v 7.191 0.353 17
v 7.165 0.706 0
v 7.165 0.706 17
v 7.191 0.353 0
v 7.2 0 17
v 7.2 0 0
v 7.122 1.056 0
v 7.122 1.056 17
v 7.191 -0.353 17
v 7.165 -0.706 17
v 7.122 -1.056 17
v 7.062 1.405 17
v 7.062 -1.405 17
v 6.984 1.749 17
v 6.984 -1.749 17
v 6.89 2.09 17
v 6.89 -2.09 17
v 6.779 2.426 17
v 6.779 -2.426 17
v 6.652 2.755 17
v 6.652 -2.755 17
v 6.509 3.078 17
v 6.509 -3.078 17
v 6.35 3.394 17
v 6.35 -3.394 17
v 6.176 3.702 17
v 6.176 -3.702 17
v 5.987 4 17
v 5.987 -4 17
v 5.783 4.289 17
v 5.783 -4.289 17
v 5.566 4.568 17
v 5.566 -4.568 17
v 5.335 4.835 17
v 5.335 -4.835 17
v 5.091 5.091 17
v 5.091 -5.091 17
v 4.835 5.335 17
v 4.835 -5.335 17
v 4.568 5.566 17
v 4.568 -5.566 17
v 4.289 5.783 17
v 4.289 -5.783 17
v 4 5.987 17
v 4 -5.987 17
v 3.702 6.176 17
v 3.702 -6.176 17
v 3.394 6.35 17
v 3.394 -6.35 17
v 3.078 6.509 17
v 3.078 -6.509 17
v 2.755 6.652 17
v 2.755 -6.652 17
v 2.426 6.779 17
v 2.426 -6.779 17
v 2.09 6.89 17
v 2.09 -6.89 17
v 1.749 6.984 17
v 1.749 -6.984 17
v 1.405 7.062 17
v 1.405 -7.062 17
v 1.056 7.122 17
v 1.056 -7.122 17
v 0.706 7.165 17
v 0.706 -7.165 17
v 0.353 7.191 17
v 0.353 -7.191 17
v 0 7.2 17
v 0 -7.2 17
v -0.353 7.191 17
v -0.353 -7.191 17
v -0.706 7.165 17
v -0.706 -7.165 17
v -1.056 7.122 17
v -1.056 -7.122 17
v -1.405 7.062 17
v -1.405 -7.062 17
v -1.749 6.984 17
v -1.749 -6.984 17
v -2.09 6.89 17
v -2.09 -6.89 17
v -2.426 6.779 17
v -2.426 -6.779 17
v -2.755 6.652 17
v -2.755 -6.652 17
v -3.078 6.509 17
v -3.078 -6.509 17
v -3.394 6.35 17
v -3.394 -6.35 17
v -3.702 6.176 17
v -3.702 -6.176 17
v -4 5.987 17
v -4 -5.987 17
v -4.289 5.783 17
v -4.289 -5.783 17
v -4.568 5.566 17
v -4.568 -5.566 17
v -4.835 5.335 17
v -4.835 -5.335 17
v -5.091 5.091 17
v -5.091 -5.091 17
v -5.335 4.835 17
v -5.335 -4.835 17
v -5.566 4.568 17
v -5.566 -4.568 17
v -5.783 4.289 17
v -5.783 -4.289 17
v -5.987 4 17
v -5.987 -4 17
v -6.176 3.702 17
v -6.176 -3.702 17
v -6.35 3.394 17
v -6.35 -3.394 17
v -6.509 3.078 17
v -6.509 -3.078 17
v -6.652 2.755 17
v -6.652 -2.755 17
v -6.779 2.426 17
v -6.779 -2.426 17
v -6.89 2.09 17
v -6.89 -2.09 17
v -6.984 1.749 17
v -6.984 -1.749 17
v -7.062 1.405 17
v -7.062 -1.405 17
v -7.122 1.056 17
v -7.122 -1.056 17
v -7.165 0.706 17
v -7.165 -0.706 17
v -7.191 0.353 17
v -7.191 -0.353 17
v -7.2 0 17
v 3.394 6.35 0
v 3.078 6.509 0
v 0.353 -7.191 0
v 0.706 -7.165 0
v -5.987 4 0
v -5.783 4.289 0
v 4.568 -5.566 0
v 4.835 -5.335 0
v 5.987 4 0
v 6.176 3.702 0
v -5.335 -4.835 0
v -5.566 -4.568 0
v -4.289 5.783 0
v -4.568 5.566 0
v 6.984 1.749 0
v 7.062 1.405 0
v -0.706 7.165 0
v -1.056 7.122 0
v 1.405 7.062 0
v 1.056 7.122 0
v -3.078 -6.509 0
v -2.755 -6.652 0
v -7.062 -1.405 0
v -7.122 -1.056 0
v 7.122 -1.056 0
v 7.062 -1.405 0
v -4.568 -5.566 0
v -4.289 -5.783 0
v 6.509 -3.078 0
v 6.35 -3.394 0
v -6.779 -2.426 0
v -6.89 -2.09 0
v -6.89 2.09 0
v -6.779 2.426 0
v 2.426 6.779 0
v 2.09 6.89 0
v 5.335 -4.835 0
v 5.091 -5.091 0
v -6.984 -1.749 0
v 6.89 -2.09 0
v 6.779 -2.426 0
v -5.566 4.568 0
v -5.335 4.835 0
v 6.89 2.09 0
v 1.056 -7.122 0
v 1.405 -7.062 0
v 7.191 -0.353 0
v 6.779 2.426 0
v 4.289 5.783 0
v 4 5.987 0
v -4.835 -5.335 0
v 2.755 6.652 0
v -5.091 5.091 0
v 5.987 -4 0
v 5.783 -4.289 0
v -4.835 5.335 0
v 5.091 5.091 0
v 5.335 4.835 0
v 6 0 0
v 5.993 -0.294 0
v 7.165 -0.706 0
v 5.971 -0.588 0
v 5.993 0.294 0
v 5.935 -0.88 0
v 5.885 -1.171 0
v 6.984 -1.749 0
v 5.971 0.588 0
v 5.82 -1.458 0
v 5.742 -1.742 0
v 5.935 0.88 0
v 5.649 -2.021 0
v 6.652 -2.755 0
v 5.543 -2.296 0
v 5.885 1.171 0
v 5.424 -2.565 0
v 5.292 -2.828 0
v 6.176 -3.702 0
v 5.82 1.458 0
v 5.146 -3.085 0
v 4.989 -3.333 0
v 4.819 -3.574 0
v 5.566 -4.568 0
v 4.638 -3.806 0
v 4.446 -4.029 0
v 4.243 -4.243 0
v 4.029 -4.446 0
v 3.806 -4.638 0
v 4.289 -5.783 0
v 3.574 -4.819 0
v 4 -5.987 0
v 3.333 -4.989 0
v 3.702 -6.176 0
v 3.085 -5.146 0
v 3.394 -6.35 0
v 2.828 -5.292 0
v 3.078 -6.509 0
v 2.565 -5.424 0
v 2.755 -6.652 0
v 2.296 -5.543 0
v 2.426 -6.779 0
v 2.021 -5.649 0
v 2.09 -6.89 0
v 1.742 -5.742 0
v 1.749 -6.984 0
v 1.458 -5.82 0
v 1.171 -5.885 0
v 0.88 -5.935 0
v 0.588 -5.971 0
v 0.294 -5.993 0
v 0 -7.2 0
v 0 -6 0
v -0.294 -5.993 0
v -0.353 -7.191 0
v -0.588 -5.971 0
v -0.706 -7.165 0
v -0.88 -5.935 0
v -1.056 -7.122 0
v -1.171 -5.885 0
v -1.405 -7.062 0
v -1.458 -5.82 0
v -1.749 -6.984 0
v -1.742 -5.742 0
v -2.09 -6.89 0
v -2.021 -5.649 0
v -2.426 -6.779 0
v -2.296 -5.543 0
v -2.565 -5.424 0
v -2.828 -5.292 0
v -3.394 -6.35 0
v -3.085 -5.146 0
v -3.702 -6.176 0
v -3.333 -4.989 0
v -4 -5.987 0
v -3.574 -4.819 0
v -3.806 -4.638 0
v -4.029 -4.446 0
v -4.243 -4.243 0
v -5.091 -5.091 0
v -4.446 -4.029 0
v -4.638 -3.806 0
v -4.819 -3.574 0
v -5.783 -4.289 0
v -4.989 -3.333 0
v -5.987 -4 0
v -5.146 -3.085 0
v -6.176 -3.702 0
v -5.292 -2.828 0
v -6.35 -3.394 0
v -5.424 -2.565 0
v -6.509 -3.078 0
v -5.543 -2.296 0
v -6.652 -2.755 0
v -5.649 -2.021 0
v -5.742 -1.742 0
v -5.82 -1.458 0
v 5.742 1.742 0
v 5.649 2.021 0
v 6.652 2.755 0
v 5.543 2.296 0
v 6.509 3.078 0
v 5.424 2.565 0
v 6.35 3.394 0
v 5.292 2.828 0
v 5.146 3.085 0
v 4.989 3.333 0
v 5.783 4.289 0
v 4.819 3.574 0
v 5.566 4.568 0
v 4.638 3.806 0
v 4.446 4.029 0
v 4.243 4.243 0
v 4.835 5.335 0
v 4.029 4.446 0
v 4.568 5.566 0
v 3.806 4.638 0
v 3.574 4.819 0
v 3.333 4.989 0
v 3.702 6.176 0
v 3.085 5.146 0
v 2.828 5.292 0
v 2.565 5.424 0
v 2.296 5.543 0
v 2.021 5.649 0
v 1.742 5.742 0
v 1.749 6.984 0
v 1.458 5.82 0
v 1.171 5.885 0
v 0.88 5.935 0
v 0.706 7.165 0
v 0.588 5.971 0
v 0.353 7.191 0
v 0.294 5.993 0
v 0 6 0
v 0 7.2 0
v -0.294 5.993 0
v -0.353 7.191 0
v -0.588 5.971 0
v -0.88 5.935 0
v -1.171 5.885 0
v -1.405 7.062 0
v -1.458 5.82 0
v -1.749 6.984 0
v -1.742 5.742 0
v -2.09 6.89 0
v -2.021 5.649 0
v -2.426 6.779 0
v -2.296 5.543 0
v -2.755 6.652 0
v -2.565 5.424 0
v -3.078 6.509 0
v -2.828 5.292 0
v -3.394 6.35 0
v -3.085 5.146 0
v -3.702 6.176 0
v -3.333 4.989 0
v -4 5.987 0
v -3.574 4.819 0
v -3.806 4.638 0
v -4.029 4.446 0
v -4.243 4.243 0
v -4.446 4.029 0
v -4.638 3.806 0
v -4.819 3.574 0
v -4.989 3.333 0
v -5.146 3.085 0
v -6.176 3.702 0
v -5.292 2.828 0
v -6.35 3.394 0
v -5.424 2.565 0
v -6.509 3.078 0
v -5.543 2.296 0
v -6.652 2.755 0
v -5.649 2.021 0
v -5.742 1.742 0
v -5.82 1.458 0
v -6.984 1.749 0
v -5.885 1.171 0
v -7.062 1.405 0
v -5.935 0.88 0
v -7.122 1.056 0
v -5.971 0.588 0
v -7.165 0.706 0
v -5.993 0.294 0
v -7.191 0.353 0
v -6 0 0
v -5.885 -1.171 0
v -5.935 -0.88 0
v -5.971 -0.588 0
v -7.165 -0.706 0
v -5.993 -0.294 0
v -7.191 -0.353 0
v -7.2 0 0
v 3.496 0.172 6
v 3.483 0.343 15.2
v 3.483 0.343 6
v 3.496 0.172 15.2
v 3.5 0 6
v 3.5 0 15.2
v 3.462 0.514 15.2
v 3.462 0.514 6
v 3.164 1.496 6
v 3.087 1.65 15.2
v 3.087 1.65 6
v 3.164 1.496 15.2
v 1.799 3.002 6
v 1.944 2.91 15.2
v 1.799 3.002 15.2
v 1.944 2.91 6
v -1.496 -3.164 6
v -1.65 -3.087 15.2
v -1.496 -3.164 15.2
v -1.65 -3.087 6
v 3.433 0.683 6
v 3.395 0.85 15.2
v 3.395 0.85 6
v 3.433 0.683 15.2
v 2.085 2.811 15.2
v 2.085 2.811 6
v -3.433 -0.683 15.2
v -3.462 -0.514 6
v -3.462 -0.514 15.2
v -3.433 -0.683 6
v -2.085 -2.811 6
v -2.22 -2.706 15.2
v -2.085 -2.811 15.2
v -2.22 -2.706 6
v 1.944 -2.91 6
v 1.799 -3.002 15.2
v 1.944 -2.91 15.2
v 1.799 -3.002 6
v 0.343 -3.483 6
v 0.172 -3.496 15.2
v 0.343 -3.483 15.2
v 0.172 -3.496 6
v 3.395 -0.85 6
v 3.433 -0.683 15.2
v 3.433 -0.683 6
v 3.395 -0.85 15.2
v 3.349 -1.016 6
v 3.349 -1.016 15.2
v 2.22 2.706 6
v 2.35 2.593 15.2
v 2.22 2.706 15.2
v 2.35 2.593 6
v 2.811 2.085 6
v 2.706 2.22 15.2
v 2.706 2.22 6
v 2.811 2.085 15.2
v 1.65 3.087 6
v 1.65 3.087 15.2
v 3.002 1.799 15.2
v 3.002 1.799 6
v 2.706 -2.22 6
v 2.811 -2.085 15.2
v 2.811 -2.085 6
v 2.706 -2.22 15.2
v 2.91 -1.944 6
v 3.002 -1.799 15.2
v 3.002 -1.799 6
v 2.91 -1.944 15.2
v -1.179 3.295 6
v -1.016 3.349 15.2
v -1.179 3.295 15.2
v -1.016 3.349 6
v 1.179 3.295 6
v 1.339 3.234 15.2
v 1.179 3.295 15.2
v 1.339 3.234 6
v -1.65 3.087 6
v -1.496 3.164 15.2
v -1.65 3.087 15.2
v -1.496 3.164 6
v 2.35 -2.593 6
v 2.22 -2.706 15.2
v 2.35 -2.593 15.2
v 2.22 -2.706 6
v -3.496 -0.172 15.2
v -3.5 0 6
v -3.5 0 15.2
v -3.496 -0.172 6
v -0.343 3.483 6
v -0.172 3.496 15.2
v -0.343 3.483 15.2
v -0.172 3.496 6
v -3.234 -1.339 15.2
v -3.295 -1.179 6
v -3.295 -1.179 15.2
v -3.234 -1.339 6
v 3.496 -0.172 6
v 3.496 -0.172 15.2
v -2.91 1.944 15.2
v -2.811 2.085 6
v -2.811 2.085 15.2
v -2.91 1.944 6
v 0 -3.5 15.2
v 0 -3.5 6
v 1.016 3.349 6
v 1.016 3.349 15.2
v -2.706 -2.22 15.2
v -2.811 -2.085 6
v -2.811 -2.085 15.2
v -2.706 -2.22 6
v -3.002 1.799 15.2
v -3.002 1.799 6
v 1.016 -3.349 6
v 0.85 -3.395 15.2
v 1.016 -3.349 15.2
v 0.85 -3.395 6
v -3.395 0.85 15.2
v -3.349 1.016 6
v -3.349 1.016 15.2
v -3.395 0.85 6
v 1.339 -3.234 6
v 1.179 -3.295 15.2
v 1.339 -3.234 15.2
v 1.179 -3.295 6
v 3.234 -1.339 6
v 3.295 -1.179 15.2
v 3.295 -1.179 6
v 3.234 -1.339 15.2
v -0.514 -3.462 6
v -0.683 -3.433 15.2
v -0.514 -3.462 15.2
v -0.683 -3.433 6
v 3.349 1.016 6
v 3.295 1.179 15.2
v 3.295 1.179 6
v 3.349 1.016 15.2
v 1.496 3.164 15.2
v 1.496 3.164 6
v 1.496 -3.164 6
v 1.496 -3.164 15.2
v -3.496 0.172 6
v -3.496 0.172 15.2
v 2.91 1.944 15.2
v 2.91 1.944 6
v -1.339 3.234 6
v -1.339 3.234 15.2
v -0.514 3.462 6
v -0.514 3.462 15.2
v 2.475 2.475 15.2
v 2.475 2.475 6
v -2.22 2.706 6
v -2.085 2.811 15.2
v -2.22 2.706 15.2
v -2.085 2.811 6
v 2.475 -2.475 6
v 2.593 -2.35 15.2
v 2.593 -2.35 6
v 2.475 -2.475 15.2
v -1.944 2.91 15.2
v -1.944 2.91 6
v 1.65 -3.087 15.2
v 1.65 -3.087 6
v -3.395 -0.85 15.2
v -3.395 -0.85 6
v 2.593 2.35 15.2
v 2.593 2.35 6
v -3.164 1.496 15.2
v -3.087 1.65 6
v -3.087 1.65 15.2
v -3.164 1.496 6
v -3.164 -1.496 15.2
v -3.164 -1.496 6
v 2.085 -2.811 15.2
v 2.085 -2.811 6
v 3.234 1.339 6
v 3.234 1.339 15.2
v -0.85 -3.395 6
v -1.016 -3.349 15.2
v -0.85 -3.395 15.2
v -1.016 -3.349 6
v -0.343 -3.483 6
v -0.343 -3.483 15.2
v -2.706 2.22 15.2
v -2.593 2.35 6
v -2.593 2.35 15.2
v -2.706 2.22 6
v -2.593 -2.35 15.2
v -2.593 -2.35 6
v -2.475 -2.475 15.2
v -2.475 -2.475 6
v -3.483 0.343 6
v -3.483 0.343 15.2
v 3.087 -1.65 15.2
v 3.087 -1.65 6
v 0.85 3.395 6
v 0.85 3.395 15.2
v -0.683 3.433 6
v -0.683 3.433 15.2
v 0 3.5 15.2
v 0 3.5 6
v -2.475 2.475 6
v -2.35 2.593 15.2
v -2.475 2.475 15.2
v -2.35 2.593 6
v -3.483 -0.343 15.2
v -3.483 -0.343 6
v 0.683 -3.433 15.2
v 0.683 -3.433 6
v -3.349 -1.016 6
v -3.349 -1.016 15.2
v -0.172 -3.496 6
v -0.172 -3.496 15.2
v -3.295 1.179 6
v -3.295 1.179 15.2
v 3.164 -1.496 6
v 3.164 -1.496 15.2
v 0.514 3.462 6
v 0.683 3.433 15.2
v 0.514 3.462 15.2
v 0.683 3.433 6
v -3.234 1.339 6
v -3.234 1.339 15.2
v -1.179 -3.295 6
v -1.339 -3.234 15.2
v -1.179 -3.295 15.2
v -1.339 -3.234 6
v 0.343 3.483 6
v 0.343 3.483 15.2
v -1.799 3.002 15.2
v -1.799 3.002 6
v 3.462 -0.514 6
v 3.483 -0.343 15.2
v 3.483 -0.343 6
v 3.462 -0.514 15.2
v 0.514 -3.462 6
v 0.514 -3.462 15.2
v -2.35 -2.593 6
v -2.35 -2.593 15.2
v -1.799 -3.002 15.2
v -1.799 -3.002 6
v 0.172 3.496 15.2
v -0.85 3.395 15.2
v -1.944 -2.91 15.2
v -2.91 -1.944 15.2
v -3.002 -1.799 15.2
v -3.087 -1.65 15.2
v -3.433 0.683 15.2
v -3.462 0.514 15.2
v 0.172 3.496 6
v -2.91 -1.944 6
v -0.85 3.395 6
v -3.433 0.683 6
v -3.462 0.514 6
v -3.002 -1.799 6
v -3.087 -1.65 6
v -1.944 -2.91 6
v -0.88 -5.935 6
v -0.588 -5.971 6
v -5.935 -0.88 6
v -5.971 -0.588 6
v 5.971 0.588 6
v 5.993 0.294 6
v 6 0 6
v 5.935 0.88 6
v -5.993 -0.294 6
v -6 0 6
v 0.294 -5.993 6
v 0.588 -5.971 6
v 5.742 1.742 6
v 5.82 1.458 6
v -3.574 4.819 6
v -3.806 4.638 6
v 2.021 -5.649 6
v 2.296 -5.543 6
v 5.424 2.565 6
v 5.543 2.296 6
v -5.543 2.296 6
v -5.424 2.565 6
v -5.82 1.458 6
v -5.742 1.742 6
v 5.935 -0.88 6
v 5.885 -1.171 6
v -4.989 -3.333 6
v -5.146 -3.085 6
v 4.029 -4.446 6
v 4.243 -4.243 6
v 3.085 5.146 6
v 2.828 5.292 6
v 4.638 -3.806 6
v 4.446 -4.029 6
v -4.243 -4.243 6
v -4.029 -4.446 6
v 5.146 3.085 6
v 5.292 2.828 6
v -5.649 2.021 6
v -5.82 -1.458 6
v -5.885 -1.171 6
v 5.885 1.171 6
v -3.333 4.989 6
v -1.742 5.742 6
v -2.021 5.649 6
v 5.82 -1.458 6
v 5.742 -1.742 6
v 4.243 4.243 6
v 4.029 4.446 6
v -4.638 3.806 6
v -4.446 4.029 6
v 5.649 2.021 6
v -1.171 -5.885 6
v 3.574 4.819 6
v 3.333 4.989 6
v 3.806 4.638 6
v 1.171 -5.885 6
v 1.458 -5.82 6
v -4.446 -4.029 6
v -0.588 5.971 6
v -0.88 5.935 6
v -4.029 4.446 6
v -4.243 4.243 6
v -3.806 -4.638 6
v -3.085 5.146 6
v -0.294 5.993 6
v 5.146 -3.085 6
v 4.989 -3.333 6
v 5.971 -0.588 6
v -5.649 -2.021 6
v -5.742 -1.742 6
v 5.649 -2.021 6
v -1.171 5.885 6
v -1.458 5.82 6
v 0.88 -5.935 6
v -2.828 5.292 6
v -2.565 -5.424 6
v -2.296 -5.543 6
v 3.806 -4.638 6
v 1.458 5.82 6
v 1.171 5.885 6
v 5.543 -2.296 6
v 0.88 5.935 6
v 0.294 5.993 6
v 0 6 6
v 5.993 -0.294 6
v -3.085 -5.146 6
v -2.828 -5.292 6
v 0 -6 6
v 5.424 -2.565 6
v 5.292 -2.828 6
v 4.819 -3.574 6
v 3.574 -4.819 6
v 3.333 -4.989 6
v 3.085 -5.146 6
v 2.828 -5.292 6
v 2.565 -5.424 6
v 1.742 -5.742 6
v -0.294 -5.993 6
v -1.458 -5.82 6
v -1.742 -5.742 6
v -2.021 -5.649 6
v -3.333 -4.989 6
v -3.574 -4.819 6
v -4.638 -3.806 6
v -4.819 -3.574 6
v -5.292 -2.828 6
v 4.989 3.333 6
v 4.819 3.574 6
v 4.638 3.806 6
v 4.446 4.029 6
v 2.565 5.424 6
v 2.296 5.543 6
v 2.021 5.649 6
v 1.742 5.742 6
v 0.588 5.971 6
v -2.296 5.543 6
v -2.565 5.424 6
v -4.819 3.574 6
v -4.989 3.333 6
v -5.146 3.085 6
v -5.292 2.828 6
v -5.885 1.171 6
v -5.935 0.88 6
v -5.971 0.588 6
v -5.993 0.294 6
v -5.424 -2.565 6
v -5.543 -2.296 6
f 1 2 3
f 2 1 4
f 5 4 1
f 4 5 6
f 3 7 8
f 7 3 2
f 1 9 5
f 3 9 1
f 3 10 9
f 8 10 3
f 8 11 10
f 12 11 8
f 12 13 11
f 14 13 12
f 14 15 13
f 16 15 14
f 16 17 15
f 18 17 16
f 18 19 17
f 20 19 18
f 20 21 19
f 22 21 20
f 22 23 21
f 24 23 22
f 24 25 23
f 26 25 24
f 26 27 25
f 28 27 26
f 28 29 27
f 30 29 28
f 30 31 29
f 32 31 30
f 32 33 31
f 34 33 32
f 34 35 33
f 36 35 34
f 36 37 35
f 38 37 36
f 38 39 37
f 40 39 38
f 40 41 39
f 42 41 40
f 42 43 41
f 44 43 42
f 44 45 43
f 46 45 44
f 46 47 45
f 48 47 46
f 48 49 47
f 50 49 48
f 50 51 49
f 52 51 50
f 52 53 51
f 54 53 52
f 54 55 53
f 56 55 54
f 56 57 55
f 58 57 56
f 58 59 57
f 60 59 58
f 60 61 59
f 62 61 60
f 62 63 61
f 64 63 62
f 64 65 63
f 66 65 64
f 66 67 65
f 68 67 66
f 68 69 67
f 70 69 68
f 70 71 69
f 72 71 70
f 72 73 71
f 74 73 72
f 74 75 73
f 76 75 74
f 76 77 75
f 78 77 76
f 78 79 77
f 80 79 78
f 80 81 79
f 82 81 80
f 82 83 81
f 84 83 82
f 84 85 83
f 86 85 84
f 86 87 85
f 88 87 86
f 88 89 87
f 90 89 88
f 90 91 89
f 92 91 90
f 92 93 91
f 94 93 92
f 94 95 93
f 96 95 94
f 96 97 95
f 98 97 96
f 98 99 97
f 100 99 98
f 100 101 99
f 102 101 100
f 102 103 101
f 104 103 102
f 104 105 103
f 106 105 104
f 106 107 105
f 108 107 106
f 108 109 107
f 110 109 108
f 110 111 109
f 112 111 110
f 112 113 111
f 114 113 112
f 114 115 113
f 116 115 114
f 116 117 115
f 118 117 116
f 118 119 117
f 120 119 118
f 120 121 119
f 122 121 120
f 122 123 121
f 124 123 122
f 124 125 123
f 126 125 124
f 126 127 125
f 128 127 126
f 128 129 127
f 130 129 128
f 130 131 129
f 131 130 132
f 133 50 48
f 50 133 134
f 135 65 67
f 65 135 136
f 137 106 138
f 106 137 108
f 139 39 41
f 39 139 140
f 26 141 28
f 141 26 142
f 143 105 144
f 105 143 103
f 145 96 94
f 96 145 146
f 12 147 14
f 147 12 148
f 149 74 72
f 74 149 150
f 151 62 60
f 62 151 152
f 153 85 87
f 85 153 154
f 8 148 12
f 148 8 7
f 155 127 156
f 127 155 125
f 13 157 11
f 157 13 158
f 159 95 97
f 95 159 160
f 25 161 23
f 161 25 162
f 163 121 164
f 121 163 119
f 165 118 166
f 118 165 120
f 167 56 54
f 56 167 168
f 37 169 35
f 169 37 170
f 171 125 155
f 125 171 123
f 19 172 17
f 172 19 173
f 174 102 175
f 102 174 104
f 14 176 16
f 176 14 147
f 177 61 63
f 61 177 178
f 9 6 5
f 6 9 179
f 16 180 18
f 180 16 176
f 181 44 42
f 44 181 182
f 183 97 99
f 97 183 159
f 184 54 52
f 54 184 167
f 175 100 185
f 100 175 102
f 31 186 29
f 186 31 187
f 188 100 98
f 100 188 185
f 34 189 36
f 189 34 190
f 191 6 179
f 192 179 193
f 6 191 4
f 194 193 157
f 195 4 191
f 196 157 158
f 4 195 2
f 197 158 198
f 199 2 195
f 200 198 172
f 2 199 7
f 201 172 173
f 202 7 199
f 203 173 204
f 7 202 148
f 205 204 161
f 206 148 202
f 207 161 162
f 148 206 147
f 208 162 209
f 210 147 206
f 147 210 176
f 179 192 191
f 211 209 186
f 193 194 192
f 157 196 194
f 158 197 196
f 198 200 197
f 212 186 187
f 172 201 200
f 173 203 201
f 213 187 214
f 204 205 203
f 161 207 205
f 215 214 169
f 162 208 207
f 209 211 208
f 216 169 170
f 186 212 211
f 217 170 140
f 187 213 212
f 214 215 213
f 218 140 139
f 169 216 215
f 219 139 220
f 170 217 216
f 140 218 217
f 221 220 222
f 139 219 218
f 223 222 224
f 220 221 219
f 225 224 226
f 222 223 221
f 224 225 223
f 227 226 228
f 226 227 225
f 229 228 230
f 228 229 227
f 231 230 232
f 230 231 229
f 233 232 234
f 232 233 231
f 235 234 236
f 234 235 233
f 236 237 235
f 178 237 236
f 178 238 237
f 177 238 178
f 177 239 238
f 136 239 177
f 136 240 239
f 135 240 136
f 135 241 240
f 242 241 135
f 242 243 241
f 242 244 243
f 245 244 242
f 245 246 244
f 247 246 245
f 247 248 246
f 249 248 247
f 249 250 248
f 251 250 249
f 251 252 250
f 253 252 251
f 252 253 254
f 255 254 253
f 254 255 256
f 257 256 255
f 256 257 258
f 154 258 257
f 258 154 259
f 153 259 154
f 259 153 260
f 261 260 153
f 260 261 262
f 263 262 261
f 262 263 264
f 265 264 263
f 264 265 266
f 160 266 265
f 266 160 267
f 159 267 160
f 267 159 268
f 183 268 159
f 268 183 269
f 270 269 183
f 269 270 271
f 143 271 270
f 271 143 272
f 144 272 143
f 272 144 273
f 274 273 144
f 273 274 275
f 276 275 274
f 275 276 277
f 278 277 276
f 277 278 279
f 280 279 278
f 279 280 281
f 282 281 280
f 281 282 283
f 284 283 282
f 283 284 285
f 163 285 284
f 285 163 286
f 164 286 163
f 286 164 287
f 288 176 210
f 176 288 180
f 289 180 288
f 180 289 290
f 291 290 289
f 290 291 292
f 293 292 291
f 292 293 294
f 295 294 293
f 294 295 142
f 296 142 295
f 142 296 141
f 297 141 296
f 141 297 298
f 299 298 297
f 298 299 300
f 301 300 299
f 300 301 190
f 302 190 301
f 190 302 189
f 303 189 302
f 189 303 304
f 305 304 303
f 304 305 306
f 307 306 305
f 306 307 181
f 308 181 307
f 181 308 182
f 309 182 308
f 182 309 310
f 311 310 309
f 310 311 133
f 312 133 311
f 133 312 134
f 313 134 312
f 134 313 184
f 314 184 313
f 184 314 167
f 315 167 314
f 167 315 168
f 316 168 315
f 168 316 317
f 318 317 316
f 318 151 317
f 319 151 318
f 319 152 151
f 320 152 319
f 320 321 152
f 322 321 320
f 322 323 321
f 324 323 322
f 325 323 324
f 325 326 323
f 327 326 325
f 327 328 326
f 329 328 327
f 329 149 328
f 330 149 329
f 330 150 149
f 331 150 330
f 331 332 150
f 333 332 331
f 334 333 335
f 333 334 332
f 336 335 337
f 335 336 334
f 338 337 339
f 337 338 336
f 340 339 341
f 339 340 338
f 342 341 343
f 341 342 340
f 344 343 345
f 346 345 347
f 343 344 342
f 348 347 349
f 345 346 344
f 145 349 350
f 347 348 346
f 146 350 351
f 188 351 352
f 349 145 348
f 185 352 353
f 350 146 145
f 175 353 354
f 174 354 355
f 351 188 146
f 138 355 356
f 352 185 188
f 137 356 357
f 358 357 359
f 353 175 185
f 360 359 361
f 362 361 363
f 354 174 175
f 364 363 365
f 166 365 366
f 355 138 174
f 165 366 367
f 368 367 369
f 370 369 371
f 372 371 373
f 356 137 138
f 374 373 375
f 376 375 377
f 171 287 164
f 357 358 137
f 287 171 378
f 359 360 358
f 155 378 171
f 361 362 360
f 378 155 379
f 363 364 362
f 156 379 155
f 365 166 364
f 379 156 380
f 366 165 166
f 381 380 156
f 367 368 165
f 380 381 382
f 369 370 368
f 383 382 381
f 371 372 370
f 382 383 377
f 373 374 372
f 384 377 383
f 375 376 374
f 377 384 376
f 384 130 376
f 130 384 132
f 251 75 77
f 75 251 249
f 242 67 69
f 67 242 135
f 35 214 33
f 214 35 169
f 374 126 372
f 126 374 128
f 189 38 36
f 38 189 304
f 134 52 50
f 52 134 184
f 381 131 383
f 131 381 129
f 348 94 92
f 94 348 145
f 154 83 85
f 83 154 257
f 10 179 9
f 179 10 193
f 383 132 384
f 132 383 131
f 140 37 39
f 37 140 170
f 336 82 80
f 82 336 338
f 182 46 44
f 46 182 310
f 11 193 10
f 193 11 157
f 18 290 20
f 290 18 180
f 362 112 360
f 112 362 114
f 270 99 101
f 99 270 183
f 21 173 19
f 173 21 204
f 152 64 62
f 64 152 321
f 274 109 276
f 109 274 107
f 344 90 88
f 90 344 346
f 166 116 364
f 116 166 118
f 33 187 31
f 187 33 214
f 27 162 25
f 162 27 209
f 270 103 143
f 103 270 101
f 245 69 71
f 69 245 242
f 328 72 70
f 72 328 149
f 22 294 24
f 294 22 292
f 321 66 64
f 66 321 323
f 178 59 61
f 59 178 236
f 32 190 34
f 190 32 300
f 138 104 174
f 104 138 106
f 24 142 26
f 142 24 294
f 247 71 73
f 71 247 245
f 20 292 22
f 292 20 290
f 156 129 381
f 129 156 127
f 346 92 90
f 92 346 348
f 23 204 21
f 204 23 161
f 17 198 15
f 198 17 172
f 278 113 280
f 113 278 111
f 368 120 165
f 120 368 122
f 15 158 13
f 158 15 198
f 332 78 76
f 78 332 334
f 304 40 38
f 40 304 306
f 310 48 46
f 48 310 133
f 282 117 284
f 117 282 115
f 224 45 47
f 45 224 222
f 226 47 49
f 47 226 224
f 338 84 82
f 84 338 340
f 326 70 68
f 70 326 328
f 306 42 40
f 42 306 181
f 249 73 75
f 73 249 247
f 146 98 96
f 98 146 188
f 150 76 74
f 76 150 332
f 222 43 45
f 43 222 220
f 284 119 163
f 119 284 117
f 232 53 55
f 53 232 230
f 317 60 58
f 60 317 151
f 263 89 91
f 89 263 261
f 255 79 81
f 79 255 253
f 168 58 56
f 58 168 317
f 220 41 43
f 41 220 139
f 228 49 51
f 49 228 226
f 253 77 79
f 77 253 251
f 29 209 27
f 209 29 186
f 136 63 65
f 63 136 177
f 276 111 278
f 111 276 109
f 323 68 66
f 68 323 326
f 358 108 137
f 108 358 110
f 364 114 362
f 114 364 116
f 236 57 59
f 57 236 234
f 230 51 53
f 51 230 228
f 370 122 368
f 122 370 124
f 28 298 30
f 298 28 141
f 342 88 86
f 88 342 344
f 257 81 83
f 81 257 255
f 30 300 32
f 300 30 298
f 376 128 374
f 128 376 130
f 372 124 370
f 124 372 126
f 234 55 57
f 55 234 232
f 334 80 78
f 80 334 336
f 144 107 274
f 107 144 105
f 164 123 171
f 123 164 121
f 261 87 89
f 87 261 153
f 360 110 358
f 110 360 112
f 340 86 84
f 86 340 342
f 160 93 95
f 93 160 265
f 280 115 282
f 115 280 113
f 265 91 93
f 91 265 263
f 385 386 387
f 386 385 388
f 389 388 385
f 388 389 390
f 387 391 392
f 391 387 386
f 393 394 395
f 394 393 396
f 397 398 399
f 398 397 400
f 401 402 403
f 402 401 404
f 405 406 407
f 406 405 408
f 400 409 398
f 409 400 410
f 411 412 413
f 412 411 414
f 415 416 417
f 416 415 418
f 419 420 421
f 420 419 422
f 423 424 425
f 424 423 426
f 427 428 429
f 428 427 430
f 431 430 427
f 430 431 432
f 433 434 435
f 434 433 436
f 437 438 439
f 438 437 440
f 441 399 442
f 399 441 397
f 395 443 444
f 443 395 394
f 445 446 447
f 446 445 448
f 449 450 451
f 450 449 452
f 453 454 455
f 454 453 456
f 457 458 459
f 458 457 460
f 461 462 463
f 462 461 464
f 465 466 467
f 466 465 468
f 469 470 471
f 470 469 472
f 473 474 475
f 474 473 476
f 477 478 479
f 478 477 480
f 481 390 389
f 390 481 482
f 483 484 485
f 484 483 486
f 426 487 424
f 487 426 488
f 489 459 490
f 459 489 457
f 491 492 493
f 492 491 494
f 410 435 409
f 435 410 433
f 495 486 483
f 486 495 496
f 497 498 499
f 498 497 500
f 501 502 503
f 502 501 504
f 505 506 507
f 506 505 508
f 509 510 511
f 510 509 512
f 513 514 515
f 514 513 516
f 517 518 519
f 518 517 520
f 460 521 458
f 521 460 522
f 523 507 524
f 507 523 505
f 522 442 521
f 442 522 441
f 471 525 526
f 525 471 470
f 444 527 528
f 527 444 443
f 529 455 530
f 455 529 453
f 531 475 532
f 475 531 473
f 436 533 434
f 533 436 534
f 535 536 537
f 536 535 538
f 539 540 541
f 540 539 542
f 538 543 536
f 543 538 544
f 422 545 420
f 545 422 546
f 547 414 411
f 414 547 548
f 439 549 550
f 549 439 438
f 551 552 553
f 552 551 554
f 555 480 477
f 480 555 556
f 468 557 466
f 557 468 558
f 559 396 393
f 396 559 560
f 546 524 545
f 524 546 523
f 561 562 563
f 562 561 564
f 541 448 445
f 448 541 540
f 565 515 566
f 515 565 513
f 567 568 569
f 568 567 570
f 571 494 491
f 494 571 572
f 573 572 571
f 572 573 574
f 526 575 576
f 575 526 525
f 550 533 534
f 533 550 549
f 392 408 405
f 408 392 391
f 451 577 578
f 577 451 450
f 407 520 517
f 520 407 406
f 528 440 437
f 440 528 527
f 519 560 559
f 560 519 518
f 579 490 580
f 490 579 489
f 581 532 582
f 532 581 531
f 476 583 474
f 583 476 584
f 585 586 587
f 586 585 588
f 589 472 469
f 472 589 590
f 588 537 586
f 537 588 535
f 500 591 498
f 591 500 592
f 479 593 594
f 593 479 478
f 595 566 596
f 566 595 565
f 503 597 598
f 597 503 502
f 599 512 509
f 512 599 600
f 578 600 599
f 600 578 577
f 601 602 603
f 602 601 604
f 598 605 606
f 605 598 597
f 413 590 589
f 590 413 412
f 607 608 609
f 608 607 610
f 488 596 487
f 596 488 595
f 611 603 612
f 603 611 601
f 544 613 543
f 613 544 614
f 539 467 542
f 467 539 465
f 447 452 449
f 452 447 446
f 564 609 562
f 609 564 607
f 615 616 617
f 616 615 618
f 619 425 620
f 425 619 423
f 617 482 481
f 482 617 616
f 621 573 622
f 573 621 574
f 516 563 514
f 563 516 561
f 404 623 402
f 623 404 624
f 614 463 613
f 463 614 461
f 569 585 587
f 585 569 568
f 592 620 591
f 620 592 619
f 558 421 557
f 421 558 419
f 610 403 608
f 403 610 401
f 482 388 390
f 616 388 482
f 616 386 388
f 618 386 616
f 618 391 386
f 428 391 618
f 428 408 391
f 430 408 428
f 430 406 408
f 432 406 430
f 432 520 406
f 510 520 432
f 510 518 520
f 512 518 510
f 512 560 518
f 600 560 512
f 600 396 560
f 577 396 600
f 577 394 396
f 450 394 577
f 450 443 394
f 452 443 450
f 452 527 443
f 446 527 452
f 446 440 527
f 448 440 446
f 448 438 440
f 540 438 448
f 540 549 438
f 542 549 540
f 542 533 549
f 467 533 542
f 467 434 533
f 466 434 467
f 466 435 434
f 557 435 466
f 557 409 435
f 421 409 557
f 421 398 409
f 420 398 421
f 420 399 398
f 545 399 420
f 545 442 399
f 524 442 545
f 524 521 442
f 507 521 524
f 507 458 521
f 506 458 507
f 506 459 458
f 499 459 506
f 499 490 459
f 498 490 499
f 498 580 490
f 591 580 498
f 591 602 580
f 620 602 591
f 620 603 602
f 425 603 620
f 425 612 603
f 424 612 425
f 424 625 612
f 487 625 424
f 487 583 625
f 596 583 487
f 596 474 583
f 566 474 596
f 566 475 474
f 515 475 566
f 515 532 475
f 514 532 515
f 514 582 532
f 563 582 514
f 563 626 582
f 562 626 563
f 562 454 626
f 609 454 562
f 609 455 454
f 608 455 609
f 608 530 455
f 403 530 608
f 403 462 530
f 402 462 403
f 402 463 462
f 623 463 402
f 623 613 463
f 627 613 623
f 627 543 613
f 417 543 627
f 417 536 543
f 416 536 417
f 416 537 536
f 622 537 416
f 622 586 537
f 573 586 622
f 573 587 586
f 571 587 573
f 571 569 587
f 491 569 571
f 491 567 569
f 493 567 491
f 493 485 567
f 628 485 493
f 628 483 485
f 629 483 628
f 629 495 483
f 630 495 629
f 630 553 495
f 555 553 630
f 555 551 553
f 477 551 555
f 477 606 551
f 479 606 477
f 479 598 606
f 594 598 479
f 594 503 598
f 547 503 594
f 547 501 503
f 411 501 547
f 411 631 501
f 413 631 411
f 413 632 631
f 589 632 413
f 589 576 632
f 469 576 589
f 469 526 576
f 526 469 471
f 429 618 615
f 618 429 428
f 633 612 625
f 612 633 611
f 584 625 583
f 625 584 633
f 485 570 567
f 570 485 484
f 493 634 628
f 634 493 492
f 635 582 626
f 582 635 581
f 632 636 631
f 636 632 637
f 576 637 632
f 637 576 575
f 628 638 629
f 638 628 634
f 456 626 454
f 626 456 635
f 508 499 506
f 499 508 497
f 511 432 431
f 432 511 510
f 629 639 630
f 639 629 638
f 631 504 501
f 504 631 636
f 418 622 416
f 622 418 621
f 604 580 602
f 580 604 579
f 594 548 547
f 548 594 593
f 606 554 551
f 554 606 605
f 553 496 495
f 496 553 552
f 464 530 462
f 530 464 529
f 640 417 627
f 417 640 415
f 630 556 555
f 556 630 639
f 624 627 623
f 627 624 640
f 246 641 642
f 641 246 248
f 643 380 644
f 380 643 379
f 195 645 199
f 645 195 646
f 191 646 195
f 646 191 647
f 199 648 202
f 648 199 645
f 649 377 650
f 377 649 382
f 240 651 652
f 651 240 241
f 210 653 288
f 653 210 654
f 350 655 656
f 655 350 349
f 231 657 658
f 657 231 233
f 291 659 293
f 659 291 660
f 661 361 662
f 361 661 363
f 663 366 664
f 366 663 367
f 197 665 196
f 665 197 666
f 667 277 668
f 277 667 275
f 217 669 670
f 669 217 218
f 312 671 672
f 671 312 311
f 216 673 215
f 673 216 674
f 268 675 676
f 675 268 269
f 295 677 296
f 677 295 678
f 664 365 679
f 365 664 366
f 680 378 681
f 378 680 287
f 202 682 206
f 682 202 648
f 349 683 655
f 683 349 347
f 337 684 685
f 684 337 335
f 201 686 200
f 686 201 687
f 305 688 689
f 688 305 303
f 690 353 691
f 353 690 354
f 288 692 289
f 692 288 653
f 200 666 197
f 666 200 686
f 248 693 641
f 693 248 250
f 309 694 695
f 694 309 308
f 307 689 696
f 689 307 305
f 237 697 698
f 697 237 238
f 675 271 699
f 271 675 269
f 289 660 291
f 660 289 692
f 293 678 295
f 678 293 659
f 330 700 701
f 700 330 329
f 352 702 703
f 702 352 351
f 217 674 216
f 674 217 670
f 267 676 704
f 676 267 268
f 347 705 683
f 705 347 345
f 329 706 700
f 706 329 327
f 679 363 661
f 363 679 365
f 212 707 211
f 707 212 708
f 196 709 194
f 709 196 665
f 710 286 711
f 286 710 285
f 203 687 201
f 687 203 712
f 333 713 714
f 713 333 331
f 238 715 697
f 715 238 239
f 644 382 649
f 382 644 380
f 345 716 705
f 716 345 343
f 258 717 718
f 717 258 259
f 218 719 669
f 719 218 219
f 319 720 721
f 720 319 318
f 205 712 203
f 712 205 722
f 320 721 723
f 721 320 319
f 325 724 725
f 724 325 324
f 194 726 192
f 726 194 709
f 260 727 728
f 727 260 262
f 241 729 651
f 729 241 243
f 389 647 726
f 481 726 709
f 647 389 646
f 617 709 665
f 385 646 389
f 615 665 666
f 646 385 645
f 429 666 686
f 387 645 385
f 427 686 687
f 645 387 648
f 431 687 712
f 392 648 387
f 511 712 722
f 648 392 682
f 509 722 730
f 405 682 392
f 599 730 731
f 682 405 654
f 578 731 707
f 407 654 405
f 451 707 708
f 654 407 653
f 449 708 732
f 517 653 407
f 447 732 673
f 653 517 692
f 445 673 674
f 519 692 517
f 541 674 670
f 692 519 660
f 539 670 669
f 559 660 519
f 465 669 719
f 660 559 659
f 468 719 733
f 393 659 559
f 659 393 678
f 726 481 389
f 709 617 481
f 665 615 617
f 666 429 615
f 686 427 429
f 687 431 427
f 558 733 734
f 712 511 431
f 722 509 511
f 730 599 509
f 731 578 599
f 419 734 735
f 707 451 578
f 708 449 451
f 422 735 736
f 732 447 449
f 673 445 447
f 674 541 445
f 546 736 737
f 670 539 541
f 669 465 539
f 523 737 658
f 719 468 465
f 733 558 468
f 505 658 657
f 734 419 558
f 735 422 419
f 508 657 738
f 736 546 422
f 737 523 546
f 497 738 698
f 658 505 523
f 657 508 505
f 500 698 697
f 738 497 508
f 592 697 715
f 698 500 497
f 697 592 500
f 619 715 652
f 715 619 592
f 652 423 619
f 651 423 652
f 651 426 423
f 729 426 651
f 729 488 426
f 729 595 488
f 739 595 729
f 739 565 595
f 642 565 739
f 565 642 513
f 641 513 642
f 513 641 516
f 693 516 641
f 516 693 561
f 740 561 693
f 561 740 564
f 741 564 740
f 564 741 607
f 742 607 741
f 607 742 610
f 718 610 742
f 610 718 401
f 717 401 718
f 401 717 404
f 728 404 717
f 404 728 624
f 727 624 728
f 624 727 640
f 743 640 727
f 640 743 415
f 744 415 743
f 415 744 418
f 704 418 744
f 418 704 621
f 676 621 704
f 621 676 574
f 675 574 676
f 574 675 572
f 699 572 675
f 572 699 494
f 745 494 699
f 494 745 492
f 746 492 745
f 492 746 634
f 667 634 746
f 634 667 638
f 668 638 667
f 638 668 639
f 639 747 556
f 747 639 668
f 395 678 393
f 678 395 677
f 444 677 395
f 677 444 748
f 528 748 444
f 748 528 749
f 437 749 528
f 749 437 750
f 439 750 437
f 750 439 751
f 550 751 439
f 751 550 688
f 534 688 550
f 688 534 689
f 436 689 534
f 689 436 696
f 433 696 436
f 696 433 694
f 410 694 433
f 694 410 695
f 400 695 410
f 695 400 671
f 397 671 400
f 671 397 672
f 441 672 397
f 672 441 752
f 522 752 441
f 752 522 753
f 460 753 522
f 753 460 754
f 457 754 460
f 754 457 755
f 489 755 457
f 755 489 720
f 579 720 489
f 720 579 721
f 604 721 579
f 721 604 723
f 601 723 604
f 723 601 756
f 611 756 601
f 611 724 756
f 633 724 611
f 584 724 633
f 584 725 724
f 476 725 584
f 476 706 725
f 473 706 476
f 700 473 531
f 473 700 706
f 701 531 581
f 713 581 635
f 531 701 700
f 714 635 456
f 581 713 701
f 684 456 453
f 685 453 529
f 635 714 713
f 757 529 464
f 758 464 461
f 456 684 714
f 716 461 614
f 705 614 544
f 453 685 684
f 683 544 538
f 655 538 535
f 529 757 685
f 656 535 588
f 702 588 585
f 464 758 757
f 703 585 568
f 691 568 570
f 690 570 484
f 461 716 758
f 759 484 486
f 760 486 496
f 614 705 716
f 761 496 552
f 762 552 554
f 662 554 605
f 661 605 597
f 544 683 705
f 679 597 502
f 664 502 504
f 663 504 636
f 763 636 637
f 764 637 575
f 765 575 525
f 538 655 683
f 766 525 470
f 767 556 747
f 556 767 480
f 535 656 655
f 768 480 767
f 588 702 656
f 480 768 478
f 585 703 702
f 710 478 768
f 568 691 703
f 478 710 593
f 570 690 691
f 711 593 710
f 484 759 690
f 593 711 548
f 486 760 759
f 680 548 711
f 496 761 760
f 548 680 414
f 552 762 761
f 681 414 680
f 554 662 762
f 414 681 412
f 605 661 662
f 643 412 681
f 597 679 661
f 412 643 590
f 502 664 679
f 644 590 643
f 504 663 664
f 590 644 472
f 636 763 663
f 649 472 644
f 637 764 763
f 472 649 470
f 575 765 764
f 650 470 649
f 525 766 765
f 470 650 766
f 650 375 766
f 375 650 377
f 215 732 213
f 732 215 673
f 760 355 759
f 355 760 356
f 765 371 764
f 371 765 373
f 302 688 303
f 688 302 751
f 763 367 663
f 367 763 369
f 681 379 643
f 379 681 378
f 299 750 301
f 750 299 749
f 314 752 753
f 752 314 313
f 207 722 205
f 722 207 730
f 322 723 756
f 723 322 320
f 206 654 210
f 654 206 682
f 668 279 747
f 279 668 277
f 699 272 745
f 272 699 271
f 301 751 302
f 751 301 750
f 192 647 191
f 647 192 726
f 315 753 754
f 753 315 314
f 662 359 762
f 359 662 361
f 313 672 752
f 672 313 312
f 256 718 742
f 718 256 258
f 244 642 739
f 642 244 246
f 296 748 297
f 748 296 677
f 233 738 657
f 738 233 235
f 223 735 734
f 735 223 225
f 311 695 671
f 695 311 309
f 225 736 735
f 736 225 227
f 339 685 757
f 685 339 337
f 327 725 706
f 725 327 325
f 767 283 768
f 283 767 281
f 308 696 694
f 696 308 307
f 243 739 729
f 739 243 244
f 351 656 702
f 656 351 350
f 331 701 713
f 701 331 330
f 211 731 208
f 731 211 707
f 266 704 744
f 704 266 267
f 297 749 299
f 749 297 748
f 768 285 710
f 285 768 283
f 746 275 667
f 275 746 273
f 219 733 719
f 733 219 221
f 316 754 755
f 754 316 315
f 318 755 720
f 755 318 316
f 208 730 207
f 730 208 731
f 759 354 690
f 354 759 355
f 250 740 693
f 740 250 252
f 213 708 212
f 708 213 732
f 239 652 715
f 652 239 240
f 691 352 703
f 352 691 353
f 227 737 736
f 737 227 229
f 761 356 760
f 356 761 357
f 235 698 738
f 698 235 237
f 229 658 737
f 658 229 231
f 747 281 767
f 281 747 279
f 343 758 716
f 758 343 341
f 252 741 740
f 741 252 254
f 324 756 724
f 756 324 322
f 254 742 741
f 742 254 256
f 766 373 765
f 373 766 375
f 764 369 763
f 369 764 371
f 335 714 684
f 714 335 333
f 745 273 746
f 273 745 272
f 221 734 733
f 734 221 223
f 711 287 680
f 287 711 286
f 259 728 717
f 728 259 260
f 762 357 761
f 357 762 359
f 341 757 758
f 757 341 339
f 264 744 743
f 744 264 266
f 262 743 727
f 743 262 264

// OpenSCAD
// Definitions
// **************************

inner_dia = 12;
thick = 1.2;

//Definition of circle angular resolution
$fn = 128;  

difference() {
    translate ([0,0,0]) cylinder (h=17,r=(inner_dia+thick*2)/2);

    translate ([0,0,-thick/2]) cylinder (h=17-thick,r=7/2);
    translate ([0,0,0]) cylinder (h=6,r=inner_dia/2);


}
     
difference() {


}



 
